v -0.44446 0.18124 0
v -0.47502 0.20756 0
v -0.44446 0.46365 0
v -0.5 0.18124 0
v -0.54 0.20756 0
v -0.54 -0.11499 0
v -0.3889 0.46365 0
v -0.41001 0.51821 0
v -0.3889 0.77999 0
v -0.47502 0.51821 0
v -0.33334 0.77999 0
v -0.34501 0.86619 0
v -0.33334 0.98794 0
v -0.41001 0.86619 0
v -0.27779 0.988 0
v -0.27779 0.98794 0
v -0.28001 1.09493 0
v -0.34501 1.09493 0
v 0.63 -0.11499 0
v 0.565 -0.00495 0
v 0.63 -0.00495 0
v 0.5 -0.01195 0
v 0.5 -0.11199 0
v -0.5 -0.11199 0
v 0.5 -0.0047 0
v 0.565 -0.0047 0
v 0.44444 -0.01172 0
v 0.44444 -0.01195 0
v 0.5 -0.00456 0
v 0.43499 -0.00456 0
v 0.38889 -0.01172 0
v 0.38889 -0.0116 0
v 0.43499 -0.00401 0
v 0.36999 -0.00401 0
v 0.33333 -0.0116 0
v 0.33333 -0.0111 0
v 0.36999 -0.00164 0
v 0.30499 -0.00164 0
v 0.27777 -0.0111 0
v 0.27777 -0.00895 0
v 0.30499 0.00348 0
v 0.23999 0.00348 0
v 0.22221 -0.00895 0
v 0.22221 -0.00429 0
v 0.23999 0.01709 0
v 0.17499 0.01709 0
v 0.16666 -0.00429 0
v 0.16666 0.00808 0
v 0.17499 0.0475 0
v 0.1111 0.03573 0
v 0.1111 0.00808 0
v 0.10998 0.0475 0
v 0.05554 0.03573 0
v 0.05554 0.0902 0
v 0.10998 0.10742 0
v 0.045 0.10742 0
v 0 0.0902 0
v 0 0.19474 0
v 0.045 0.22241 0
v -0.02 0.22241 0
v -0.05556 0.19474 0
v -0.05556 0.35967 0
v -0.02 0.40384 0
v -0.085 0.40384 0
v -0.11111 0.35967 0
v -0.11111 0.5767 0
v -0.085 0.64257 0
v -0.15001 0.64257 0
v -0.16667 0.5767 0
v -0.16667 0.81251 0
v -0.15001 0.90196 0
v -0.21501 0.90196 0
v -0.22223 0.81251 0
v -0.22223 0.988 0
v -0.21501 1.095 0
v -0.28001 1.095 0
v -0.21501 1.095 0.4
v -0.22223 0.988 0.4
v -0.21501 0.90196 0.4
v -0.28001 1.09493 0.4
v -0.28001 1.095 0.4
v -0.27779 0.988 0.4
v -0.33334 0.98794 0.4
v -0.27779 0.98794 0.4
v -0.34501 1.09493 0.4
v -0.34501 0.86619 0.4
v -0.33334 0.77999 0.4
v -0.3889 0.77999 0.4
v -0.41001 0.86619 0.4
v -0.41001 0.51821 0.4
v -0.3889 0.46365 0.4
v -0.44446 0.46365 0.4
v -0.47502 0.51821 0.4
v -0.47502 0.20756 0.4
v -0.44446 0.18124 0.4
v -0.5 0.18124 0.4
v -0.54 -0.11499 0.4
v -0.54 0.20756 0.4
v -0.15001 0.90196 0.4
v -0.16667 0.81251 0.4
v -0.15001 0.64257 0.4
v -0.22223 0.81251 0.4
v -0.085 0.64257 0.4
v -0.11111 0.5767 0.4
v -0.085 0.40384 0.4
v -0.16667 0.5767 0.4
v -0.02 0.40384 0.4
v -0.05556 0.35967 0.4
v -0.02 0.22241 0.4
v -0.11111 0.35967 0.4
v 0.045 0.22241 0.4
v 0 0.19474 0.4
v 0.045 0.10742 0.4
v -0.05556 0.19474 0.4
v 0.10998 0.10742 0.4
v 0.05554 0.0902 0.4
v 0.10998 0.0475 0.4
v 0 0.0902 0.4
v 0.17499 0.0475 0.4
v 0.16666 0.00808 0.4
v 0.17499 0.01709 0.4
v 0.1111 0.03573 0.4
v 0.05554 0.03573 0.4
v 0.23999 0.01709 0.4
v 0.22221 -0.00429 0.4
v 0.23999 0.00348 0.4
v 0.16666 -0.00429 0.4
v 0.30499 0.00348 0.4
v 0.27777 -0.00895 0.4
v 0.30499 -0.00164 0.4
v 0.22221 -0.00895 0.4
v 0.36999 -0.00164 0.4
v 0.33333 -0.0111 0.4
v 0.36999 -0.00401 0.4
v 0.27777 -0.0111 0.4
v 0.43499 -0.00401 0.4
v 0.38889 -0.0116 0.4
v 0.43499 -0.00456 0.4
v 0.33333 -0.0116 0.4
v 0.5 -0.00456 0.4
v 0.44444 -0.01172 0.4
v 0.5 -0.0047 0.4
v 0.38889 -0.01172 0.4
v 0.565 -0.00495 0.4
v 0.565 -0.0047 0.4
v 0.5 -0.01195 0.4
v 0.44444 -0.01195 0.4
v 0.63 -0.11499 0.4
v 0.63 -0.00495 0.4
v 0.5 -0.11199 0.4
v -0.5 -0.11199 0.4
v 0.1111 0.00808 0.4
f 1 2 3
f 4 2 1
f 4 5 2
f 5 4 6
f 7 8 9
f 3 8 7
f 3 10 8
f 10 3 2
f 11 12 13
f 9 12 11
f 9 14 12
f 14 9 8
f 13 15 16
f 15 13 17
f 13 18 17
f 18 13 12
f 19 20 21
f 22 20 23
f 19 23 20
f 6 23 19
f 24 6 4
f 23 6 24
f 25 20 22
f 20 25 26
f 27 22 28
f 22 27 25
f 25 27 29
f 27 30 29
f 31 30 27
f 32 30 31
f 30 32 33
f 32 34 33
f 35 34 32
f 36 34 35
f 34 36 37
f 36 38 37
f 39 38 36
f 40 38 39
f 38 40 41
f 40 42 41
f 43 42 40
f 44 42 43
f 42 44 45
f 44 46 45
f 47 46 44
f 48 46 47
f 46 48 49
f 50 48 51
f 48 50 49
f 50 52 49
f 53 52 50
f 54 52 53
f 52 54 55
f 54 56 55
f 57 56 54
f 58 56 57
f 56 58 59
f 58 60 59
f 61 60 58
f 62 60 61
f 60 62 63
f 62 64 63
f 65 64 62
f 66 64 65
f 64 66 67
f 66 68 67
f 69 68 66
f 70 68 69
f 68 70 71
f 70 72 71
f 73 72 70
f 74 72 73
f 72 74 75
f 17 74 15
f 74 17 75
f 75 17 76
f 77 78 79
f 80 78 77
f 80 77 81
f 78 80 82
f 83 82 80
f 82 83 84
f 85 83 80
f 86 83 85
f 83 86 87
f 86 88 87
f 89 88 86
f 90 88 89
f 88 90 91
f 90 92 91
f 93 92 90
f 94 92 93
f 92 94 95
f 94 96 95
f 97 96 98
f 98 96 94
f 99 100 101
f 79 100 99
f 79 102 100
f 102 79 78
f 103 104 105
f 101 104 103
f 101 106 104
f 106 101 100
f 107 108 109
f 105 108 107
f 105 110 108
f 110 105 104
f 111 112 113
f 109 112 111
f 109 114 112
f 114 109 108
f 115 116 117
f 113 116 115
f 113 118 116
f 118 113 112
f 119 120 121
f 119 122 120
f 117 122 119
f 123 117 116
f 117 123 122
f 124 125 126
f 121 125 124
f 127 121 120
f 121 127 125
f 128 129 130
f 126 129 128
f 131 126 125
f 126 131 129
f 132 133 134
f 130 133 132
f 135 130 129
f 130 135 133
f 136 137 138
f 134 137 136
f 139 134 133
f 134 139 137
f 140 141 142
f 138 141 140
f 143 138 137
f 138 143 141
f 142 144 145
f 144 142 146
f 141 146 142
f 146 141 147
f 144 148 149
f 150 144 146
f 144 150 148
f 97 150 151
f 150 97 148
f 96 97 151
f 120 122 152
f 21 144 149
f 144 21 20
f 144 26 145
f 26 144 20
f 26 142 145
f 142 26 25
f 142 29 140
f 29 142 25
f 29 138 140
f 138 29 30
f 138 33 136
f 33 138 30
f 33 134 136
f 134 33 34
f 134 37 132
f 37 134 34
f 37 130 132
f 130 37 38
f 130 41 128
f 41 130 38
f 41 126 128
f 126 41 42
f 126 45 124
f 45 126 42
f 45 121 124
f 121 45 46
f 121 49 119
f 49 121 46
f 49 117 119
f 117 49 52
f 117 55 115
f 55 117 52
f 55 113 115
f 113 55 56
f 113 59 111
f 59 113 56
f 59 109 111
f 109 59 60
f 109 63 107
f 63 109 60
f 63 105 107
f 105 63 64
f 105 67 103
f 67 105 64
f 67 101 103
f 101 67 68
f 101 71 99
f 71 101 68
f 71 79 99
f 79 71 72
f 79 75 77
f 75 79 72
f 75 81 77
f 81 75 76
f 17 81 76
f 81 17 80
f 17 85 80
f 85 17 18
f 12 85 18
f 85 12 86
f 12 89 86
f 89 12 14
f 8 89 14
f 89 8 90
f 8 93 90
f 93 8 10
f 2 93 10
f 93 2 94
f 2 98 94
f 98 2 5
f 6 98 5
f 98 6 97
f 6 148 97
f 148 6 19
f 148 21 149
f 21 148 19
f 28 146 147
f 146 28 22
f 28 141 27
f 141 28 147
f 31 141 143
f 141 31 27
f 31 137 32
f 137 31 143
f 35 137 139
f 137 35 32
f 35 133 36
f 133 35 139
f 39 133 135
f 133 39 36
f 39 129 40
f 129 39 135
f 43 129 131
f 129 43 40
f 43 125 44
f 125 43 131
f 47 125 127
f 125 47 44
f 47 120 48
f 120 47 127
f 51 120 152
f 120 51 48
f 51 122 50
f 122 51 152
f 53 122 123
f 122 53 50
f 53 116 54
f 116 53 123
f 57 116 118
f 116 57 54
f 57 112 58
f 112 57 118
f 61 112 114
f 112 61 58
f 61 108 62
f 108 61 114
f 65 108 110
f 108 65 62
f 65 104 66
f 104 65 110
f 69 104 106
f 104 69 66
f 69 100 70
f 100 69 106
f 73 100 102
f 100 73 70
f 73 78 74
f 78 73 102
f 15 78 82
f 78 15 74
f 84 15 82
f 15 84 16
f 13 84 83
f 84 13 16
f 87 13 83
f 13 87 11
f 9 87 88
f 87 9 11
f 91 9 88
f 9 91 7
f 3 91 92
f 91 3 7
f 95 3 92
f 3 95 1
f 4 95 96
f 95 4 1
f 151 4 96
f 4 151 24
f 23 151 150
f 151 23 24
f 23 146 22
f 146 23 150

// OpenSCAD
points = [
	[0, -0.1],
	[0.0, 0.04040862656072645],
	[0.0, 0.04040862656072645],
	[0.0, 0.19324631101021567],
	[0.05555555555555555, 0.19324631101021567],
	[0.05555555555555555, 0.4756526674233825],
	[0.1111111111111111, 0.4756526674233825],
	[0.1111111111111111, 0.7919977298524404],
	[0.16666666666666666, 0.7919977298524404],
	[0.16666666666666666, 0.9999432463110102],
	[0.2222222222222222, 0.9999432463110102],
	[0.2222222222222222, 1.0],
	[0.2777777777777778, 1.0],
	[0.2777777777777778, 0.8245175936435868],
	[0.3333333333333333, 0.8245175936435868],
	[0.3333333333333333, 0.5887060158910329],
	[0.3888888888888889, 0.5887060158910329],
	[0.3888888888888889, 0.3716799091940976],
	[0.4444444444444444, 0.3716799091940976],
	[0.4444444444444444, 0.20675368898978433],
	[0.5, 0.20675368898978433],
	[0.5, 0.10221339387060159],
	[0.5555555555555556, 0.10221339387060159],
	[0.5555555555555556, 0.04772985244040863],
	[0.6111111111111112, 0.04772985244040863],
	[0.6111111111111112, 0.020090805902383654],
	[0.6666666666666666, 0.020090805902383654],
	[0.6666666666666666, 0.007718501702610669],
	[0.7222222222222222, 0.007718501702610669],
	[0.7222222222222222, 0.0030646992054483542],
	[0.7777777777777778, 0.0030646992054483542],
	[0.7777777777777778, 0.0009080590238365494],
	[0.8333333333333334, 0.0009080590238365494],
	[0.8333333333333334, 0.0003972758229284904],
	[0.8888888888888888, 0.0003972758229284904],
	[0.8888888888888888, 0.00028376844494892167],
	[0.9444444444444444, 0.00028376844494892167],
	[0.9444444444444444, 5.675368898978434e-05],
	[1.0, 5.675368898978434e-05],
	[1, -0.1],
	[0, -0.1]
];
difference(){
    
// OUTER COOKIE CUTTER SHAPE
    
    // extrude the outer polygon into a 3D shape
    // this extrusion is thinner than the inner shape to make sure the inner shape "cuts" through it completely
    linear_extrude(0.4)
    
        // x- and y-shift the outer polygon to be roughly centered around the inner shape
        // z-shift the outer polygon so the extruded inner shape cuts all the way through
        translate([-0.54, -0.005, -0.1])
            
            // scale this polygon up a bit to make an outer ring of a cookie cutter
            scale([1.17, 1.1, 1.2])
            
                // generate a polygon to become the outer shape
                polygon(points);        
    
// INNER COOKIE CUTTER SHAPE TO BE SUBTRACTED FROM OUTER

    // extrude the inner polygon into a 3D shape
    // this extrusion is thicker than the outer shape to ensure the inner shape "cuts" completey through the outer shape
    // the "scale" parameter grows the shape as it extrudes to give the finished cutter a narrower edge
    linear_extrude(0.6) 
    
        // x-shift the shape to 
        translate([-0.5, -0.012, 0]) //x-center the polygon at origin
            
            // generate a polygon to become the inner shape (this is effectively defining a hole)
            polygon(points);
}
